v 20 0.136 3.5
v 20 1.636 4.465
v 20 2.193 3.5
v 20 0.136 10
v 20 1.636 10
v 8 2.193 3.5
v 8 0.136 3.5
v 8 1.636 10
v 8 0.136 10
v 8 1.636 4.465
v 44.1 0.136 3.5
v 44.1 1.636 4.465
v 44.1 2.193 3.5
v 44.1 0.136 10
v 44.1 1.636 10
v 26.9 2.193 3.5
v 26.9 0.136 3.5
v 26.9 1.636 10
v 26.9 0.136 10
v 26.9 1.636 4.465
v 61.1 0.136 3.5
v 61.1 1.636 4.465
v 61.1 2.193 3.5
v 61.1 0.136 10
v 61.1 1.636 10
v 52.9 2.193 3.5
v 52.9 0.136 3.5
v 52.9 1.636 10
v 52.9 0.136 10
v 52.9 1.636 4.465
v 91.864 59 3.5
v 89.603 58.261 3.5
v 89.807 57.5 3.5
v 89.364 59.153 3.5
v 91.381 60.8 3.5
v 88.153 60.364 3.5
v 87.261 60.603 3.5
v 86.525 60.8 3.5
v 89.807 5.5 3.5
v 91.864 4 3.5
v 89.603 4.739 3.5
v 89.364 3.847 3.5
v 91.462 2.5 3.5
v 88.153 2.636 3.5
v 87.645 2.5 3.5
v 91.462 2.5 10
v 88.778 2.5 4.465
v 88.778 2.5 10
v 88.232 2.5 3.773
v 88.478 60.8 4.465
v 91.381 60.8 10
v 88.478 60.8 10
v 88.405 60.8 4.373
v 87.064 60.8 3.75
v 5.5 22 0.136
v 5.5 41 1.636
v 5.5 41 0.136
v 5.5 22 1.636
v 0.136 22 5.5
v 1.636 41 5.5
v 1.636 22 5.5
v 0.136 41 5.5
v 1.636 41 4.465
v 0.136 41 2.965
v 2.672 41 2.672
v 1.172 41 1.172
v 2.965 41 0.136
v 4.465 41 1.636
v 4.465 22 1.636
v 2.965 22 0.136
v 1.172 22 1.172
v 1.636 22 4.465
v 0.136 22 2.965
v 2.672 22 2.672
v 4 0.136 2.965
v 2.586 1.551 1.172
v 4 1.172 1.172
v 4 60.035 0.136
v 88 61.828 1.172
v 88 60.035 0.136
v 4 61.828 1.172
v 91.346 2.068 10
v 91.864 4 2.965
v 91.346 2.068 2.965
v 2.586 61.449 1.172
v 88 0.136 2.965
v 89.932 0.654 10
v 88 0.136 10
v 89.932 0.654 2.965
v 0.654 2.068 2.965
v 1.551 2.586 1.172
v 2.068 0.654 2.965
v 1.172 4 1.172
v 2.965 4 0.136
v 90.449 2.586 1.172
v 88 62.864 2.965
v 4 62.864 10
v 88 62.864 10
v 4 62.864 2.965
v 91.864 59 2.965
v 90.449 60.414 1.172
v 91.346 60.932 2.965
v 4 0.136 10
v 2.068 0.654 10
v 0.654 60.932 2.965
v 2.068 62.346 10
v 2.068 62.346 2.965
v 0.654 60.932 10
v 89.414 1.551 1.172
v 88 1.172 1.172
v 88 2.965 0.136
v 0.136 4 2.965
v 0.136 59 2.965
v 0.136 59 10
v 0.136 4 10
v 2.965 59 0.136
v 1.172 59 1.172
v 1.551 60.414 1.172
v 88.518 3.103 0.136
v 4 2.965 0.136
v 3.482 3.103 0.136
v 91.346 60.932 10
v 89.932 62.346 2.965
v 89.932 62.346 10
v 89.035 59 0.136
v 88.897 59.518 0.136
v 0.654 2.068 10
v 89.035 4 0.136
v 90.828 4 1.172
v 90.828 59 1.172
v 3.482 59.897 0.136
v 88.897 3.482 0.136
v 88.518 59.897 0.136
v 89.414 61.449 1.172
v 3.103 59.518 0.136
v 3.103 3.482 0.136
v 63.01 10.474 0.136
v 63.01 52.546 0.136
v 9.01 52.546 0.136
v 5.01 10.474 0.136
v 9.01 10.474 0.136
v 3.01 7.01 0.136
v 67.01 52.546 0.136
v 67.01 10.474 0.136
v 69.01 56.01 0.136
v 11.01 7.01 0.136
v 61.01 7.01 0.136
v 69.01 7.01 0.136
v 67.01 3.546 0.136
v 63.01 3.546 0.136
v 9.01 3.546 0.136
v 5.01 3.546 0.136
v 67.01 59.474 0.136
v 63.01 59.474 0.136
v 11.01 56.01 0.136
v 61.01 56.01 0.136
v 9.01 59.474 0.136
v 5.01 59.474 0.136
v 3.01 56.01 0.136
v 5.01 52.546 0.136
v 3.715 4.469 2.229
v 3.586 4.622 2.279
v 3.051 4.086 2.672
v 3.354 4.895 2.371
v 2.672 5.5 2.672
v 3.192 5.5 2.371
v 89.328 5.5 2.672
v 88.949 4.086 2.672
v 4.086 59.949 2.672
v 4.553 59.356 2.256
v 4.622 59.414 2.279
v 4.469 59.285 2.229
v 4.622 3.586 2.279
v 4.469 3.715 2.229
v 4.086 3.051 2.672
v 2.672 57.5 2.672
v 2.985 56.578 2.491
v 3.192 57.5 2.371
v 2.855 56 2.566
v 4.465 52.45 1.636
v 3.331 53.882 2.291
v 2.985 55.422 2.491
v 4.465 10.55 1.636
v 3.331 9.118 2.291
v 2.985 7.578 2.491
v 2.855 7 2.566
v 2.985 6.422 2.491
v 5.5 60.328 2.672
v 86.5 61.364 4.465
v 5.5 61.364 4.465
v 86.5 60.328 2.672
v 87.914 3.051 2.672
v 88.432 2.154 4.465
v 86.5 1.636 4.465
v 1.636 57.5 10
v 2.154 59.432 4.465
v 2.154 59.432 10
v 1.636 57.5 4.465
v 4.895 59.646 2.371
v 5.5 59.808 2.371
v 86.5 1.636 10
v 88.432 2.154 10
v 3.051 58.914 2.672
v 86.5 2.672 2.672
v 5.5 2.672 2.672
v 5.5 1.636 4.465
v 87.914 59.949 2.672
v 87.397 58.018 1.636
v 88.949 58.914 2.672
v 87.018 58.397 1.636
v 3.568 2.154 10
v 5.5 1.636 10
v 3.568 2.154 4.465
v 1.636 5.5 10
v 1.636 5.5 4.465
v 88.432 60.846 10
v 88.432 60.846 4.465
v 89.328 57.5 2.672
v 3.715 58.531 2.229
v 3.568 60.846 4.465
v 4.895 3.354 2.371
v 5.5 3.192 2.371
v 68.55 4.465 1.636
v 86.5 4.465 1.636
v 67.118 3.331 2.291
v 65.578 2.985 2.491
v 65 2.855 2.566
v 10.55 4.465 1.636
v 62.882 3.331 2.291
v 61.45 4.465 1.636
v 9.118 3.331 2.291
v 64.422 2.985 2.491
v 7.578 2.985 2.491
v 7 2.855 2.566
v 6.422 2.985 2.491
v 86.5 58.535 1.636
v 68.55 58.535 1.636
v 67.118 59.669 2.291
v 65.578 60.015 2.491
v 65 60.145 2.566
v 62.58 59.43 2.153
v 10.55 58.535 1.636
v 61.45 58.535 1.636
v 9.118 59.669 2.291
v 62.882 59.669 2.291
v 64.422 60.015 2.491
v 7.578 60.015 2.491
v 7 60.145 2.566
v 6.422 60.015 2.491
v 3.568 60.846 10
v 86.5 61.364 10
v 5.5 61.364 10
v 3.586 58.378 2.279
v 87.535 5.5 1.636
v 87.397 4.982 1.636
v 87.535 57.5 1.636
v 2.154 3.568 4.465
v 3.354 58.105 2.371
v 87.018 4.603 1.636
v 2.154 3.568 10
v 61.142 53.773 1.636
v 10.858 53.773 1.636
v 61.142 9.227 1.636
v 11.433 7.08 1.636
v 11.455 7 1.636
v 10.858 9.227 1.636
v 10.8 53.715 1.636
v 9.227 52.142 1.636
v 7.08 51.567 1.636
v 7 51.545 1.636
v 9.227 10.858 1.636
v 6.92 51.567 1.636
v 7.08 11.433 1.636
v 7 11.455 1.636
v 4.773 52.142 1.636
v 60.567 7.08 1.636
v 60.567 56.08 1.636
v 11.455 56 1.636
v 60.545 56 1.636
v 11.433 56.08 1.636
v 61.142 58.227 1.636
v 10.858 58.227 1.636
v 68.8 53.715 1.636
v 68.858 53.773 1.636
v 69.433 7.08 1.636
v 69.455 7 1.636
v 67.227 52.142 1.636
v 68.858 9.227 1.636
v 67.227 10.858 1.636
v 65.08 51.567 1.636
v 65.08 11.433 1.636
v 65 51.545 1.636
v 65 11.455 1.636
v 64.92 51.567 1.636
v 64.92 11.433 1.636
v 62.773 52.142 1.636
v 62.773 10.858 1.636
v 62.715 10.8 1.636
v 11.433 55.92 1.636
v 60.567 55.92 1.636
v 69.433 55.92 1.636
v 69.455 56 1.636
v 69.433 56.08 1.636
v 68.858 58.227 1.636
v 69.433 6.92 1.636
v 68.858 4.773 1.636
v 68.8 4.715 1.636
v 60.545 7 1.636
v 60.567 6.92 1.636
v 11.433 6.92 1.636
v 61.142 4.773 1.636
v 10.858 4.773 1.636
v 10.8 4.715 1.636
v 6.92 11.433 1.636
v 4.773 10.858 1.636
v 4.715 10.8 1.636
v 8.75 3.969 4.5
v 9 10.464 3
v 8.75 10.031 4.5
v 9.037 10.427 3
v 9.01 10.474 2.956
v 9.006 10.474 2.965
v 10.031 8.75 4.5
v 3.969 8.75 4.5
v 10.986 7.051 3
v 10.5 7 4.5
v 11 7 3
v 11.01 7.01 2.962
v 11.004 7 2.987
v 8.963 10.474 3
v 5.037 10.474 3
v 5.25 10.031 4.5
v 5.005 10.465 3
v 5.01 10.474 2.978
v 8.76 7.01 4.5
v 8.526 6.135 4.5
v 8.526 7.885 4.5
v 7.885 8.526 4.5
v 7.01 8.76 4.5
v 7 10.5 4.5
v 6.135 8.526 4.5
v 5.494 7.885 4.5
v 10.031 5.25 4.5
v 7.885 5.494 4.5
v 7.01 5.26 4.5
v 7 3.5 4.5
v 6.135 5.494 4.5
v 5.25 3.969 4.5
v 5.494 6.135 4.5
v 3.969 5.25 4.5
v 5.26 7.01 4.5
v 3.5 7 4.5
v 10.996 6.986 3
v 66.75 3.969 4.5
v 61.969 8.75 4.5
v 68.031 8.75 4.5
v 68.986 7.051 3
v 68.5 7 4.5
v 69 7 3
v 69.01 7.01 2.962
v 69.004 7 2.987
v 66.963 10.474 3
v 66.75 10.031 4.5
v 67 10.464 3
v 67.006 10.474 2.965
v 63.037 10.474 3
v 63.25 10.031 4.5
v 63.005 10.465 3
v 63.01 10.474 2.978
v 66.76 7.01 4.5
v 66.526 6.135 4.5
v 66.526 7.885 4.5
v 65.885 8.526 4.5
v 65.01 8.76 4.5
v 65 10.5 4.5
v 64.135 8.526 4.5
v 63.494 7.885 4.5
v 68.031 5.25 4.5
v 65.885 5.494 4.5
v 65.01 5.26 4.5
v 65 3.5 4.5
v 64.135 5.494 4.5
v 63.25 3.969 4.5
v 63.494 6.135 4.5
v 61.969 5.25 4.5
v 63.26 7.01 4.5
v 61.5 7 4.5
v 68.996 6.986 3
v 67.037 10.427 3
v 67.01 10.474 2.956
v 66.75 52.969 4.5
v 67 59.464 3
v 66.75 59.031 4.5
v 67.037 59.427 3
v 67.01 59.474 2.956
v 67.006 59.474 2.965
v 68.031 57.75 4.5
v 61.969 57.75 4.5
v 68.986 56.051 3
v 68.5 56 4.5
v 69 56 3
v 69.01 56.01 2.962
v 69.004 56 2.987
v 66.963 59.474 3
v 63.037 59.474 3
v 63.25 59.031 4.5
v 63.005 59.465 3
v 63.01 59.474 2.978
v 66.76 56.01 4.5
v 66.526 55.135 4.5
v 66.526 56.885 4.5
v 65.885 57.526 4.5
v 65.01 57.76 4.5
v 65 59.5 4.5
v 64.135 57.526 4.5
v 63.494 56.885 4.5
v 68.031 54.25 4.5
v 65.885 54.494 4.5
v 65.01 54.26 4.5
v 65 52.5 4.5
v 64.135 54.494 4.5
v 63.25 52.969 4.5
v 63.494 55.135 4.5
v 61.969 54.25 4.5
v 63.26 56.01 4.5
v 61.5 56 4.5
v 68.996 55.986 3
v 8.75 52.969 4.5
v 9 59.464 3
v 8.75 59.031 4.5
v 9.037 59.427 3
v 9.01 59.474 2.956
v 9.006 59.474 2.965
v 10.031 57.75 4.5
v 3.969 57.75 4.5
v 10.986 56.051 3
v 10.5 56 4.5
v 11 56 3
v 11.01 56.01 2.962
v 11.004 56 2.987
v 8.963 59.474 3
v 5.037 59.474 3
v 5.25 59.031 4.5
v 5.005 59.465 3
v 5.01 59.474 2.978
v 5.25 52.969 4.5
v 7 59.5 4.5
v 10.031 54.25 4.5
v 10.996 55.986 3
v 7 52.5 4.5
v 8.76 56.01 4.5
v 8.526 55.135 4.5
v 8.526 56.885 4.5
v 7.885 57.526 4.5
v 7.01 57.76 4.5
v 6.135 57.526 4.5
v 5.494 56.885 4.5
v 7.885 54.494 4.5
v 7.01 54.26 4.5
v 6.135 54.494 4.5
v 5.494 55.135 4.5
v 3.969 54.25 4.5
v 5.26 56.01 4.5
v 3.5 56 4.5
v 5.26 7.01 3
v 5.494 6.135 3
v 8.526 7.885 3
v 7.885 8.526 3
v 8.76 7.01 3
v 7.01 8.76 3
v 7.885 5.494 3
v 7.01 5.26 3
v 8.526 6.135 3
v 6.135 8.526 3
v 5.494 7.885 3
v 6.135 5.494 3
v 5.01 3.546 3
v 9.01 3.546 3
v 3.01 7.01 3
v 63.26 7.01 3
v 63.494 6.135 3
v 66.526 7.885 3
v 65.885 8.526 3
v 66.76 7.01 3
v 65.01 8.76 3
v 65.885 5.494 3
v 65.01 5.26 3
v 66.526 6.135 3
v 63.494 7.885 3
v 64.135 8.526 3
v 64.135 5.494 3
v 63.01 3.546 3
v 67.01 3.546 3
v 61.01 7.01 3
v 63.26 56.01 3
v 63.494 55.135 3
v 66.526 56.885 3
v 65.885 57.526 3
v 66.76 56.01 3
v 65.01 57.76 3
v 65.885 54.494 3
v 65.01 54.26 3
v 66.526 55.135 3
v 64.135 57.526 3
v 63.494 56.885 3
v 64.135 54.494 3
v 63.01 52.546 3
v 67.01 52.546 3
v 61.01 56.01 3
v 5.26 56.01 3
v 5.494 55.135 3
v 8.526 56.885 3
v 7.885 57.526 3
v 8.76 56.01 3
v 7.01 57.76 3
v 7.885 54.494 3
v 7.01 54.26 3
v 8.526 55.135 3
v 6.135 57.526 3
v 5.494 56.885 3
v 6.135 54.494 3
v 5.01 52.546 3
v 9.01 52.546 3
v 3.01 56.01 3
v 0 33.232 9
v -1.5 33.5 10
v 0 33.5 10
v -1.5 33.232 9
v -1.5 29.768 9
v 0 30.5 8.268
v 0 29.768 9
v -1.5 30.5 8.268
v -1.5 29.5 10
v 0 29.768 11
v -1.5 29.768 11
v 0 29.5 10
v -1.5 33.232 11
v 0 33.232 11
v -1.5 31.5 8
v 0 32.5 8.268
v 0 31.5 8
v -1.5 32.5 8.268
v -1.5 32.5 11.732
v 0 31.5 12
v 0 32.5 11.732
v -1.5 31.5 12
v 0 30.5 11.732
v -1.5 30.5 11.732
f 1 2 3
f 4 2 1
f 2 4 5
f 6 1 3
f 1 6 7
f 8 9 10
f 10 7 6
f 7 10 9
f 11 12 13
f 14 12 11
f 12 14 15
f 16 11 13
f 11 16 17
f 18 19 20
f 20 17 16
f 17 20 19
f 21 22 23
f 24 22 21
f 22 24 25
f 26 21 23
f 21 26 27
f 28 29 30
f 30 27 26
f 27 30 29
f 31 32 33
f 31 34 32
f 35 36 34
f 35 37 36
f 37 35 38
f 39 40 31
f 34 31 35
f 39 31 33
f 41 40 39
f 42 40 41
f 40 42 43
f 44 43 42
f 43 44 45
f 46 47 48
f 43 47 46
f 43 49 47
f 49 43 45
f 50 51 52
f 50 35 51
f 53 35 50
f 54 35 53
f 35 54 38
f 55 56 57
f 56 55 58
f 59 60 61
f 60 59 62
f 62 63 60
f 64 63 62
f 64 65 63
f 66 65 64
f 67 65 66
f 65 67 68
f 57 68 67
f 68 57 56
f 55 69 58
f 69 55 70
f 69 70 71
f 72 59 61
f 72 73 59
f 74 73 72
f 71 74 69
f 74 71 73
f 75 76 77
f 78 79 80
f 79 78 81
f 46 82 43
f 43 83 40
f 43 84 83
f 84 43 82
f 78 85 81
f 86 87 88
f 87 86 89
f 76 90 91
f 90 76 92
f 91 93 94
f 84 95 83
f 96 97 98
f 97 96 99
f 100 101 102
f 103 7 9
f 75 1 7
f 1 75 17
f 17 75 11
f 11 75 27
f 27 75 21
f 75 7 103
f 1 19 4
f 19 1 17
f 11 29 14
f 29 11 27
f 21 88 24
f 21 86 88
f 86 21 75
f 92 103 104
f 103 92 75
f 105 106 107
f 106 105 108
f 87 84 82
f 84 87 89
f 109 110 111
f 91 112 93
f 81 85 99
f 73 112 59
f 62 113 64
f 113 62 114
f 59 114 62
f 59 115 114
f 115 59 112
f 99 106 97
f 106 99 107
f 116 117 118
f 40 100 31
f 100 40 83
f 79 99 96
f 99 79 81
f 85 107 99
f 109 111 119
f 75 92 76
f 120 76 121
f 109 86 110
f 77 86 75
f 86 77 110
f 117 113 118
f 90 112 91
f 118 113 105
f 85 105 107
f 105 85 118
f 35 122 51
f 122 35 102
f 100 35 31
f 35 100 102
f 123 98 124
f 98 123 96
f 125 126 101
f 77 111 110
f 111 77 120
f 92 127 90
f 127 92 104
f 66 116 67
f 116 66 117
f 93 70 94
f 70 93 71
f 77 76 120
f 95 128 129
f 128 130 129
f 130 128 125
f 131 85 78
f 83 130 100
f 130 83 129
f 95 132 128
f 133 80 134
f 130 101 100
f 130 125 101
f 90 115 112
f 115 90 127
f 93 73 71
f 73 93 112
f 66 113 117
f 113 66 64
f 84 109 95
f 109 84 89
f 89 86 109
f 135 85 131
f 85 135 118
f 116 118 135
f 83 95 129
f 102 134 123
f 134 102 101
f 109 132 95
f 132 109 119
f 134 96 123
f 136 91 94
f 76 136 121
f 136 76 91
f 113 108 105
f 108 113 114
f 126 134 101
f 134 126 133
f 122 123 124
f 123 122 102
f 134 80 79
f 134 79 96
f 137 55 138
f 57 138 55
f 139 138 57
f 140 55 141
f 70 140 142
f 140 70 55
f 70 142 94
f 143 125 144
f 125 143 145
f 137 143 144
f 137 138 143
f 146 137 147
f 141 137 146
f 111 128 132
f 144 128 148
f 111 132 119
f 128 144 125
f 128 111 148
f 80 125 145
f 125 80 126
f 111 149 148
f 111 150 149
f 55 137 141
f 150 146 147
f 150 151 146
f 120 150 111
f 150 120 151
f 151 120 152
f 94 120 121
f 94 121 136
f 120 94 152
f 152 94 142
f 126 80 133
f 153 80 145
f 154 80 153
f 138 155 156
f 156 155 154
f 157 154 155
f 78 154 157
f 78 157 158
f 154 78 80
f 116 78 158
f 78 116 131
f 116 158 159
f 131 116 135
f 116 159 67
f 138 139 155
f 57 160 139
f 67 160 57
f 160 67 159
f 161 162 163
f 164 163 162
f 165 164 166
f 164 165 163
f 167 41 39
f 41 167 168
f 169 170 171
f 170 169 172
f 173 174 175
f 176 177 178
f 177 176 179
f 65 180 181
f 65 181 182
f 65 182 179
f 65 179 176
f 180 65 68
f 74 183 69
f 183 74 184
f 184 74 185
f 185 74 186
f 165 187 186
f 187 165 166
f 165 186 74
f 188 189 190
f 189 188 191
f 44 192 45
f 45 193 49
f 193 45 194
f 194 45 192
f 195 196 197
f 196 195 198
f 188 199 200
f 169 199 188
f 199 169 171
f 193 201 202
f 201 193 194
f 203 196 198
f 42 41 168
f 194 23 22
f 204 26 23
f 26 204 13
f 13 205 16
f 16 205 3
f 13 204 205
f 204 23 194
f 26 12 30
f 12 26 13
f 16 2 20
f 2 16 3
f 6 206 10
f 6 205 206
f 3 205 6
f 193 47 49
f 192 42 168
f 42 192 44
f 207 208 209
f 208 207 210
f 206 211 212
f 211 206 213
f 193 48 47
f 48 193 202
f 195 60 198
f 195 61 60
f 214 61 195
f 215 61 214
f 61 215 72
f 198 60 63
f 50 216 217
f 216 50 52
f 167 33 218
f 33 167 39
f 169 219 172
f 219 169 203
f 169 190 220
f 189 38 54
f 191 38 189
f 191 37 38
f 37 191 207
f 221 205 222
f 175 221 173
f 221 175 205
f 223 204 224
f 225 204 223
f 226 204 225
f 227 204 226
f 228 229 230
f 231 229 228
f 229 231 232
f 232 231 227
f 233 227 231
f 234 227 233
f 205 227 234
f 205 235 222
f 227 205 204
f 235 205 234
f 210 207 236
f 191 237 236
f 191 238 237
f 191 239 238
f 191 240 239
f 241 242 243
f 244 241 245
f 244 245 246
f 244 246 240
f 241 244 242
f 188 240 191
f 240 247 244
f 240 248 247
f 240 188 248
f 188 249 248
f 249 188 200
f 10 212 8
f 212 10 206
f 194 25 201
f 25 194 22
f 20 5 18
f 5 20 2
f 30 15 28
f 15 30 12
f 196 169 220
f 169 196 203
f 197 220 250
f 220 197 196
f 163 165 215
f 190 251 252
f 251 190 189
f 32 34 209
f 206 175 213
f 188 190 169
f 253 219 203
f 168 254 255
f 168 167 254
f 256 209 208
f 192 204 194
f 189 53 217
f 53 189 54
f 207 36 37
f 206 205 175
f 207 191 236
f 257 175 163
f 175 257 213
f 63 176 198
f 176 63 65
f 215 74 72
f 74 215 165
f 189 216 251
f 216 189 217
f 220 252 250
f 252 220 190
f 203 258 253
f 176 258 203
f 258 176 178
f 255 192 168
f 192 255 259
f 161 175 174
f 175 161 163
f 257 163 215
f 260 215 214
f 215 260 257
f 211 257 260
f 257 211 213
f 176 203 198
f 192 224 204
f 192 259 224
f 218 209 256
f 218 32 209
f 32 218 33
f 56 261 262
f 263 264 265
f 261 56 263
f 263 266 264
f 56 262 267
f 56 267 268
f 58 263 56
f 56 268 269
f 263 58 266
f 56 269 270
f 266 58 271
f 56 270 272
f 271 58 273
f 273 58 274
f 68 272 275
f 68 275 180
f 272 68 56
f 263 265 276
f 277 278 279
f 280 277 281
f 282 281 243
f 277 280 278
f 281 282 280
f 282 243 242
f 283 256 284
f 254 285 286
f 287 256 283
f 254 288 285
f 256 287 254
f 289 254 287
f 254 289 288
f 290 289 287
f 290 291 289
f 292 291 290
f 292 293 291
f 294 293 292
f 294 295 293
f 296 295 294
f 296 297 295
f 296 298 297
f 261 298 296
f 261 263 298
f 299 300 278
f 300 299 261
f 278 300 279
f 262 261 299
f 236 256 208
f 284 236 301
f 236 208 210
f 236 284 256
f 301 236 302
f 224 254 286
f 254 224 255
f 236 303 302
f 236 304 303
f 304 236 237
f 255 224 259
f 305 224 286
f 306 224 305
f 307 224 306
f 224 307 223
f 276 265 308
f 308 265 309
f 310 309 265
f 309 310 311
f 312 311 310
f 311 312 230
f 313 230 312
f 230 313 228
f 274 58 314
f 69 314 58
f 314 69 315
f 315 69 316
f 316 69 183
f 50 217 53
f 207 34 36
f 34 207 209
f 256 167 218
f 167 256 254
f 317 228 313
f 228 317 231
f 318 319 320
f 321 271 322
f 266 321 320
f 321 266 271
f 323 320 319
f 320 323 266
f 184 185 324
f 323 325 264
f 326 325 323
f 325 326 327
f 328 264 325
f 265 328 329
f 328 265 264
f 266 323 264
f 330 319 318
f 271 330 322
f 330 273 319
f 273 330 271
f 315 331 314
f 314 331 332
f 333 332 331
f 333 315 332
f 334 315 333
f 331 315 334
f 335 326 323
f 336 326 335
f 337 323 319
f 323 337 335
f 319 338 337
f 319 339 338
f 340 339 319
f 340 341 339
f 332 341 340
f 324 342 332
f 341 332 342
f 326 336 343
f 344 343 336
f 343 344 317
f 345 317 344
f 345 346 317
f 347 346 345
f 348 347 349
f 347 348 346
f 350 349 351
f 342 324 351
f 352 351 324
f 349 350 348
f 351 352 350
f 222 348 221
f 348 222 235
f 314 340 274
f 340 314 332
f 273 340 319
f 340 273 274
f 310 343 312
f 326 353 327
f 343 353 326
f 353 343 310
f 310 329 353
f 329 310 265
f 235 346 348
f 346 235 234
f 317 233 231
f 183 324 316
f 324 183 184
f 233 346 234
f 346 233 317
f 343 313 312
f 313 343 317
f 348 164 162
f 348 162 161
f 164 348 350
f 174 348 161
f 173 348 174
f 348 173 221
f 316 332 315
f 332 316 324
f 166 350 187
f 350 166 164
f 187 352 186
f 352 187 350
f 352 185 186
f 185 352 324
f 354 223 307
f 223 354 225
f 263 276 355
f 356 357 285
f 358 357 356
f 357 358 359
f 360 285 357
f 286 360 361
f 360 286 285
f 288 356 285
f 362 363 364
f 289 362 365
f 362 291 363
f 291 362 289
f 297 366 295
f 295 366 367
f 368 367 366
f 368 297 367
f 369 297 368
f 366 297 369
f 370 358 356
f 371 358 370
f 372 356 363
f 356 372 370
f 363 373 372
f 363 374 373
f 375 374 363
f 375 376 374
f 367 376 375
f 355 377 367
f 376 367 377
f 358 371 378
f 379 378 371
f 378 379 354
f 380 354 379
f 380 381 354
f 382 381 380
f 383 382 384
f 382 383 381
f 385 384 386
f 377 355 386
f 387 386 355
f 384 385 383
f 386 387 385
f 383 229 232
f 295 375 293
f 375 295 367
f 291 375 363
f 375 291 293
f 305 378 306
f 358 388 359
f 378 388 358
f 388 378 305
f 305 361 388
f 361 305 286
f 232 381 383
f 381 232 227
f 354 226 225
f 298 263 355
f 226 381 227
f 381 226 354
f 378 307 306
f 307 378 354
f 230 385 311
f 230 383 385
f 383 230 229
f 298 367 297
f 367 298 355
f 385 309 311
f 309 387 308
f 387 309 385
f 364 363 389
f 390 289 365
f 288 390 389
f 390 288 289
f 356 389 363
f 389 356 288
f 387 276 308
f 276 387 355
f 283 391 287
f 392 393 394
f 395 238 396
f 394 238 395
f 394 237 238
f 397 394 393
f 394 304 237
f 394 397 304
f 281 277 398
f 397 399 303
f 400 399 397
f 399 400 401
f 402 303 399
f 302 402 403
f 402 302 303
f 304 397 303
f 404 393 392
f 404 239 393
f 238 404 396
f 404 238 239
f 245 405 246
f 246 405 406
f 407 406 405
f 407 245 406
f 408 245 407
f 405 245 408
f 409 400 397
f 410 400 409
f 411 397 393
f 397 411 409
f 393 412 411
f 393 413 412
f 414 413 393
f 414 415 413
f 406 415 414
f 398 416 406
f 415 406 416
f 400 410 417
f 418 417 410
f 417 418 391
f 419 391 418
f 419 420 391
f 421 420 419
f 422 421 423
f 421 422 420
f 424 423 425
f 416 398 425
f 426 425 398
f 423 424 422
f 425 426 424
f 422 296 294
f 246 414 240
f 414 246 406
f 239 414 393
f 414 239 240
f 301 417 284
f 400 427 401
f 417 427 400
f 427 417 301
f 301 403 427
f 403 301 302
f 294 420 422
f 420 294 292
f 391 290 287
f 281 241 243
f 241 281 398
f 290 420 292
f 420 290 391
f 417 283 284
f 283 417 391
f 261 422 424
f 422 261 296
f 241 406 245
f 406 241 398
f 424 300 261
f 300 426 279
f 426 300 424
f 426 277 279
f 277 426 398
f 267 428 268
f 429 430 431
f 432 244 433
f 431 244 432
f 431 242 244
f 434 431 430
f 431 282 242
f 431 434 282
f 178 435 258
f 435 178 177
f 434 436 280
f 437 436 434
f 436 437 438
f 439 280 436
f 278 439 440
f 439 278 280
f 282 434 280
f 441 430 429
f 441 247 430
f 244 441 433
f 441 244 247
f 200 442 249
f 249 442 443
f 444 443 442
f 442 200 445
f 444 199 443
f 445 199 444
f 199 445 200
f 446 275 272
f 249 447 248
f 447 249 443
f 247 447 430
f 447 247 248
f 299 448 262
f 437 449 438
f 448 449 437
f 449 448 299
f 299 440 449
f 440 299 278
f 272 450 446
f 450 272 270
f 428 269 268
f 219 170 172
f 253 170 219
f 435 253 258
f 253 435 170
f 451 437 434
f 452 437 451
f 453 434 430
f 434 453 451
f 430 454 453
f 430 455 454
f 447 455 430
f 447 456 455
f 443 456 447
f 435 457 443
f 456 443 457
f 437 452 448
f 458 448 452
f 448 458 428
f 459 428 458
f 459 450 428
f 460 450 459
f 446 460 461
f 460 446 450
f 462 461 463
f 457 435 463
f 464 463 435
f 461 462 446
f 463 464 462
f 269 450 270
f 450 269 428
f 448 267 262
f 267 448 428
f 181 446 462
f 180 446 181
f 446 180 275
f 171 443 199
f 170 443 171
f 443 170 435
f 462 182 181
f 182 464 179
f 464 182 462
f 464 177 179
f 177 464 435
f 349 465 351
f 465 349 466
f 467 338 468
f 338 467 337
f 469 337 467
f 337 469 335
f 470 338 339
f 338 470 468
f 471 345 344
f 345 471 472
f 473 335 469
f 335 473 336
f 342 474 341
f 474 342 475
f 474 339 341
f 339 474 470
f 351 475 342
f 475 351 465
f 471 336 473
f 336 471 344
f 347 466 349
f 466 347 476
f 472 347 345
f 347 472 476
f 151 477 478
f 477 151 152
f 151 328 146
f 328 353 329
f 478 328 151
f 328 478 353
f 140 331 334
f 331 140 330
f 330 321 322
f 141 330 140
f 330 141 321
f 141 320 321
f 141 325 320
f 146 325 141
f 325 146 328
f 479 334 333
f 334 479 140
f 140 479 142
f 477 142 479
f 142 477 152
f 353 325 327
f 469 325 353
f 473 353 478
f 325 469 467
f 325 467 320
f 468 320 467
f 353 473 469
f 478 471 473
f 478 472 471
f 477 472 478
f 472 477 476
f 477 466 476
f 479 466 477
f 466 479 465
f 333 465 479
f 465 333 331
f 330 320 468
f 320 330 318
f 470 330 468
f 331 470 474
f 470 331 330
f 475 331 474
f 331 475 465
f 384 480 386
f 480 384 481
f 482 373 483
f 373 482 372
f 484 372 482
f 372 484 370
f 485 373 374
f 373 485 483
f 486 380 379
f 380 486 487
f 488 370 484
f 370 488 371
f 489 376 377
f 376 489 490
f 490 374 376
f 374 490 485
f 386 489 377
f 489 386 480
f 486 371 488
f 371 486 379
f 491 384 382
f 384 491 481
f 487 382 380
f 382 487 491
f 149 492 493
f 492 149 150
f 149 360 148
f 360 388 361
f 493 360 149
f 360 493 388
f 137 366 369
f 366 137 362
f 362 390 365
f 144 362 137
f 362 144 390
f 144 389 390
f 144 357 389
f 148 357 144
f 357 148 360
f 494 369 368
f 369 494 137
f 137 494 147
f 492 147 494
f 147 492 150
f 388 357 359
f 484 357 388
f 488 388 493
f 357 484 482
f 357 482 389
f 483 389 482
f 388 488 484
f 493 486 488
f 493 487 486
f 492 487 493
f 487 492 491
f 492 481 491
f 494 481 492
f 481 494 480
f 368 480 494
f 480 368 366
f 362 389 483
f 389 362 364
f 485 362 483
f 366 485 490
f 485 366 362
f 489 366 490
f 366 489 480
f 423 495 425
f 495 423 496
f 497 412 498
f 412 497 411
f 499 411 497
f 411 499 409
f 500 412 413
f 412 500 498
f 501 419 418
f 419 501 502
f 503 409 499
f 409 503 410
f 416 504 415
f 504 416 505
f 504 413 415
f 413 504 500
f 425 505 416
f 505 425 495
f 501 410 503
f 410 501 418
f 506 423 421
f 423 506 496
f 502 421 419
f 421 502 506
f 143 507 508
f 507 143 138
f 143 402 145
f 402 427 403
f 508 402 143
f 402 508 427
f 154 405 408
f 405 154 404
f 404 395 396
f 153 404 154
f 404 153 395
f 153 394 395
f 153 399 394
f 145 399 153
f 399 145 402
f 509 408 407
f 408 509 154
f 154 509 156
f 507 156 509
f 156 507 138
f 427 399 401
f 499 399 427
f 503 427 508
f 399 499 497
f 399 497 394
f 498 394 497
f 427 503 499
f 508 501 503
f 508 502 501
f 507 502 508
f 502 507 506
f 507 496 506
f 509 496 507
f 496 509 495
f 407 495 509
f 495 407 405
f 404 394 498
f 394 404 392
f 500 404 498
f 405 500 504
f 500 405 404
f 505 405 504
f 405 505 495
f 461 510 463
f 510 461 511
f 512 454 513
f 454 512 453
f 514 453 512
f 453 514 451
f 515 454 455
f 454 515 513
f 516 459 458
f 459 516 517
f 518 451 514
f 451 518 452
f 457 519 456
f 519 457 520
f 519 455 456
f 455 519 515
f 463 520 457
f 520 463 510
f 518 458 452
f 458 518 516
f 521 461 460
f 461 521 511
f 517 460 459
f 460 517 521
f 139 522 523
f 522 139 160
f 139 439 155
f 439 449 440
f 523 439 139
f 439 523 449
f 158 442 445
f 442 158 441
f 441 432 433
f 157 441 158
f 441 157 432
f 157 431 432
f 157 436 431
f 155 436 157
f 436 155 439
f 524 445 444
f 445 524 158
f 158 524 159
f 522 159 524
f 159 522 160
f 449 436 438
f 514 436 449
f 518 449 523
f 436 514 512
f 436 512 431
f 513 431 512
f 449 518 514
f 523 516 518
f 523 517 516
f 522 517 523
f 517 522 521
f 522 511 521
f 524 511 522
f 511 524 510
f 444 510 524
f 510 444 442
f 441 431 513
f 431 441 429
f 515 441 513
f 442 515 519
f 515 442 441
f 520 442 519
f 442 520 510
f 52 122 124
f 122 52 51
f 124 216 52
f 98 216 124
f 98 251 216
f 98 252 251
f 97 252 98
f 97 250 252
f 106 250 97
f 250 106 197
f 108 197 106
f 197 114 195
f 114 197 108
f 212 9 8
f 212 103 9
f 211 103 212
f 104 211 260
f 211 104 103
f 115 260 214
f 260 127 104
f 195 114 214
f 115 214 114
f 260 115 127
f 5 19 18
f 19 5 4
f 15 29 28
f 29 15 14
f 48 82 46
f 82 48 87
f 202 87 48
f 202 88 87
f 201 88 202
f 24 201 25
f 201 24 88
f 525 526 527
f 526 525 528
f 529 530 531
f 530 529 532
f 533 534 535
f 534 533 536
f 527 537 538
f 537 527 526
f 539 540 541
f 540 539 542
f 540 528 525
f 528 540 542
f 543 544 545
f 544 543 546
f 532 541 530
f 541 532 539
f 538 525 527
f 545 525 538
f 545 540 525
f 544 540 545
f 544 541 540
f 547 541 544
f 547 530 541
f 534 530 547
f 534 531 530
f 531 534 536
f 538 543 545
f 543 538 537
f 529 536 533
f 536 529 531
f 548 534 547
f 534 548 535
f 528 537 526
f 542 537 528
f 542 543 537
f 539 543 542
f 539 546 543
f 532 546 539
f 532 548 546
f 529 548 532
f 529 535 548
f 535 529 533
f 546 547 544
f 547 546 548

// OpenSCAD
/*  RASPBERRY PI2 case
-- Parametric as below
-- Uses a set of measurements for box cutouts for devices
-- Rounded corners
*/
/* Rasberry Pi2 box (should fit B+ as well)
How it works:
    Make a rounded box
    Subtract the interior 
    Enlarge the devices so they protrude then subtract them.
    Slice top and bottom halves.
    Add lugs, holes and stand offs
*/

board = [85, 56 , 1.3 ];  //dimension of rasp pi
t     = 1.40;             //Thickness of rasp pi board
p     = 1.5;              //Thickness of plastic case
g     = 2;                //gap around board
$fn   = 12;               //roundness of rendering
rb    = 4;                //roundness of box
huge  = 200;              // for drilling out holes etc 
stand_off = 3;            //raise board above bottom plastic
box   = board + [7 , 7, 20];  //outside dimensions of our case
bh    = 10;               //Where to slice box
d = 3.5;                  //displacement of hole from edge  
eps = 0.01;               //a very tiny value
/*
Actual device sizes and positions (some already extend over edge of board)
most of these numbers are measurements or off spec sheet
NOTE KEEPING TRACK OF COORDINATE SYSTEMS IS CRITICAL
These are measured  coordinates with zero point at BOTTOM lefthand corner of board

device = [[position of device],[device size],[adjust hole position], [enlarge device for hole]]
*/ 

micro =  [[6.5  ,-1.5 ,0] ,[8    ,6     , 3   ] ,[-1, -10,    0] , [2,   4,  2  ]];
hdmi  =  [[24.4 ,-2   ,0] ,[15.2 ,12    , 7.9 ] ,[0,  -10,    0] , [0,  10,  0  ]];
camera=  [[43   ,0    ,0] ,[4    ,22.4  , 7   ] ,[0,    0,    0] , [0,   0, 10  ]];
audio =  [[50.4 ,-2   ,0] ,[6.2  ,14.5  , 6.4 ] ,[0,  -10,    0] , [0,  10,  0  ]];
ether =  [[65.5 ,2    ,0] ,[21.2 ,15.9  , 15  ] ,[0,   -2,    0] , [5,   4, 10  ]];
//widen usb and ether so we dont have a thin vertical strip of weak plastic
usb1  =  [[70   ,21.4 ,0] ,[17.4 ,15.3  , 17.4] ,[0,   -2,    0] , [0,   4, 10  ]];
usb2  =  [[70   ,39   ,0] ,[17.4 ,15.3  , 17.4] ,[0,   -2,    0] , [0,   4, 10  ]];
gpio  =  [[7.2  ,50   ,0] ,[50   ,5.1   , 9   ] ,[0,    0,    0] , [0,   0, 10  ]];
display= [[1.5  ,17   ,0] ,[3.9  ,22.3  , 6   ] ,[0,    0,    0] , [0,   0, 10  ]];
//SD is below the board so needs to drop a fair bit to give access to the card
SD    =  [[-3  ,19.5 ,-2.5] ,[14   ,17  , 2.5 ] ,[-16,   0,    -4] , [6,   0,  4  ]];
// make a list so we can handle our devices as a group 
echidna = [micro,hdmi,camera,audio,ether,usb1,usb2,gpio,display,SD];  

shift =[p+g,p+g,p+stand_off];  //plastic + gap at edge and height of screw pad
holes =  [[p+g+d, p+g+d], [65, p+g+d], [65, 56], [p+g+d, 56]]  ;
toplugs =[
          [[box[0]*4/5,p+p/2, box[2]-bh],[90,0,0]],
          [[box[0]*4/5,box[1]-p-p/2,bh], [90,0,0]],
          [[p+p/2,box[1]*3/4-p-p,bh],[0,90,0]],
          [[p+p/2,box[1]/4-p-p,bh],[0,90,0]]
          ];        
 bottomlug =[[-p/2,box[1]/2,bh],[0,90,0]];

//Utility module to make a solid box with rounded corners
module hull_build(box,r){
    //spheres at the corners of a box and run hull over it
    x = box  - 2 * [r,r,r];
    difference(){
    hull(){
        for (i=[0:1]){
            for (j=[0:1]) {
                for (k=[0:1]){
                        translate([i*x[0],j*x[1],k*x[2]]+[r,r,r]) //move up r because we moved box up
                            sphere(r);
                            }            
                        }   
                    }  
              }   
         }  
}


module complete_box(){
    embiggen = [2,2,2]; // make holes 1mm bigger all round
    //substract devices out of our case
    difference(){
        hull_build(box,rb); //outer shell
        translate([p,p,p])hull_build(box-[p+p,p+p,p+p],rb);  //smaller box(interior)
    //move, embiggen then subtract
        for (i=echidna) {
            translate(i[0] + i[2] + shift -embiggen/2) 
                    cube(i[1]+ i[3] + embiggen);
                        }
                }
   }
   
module stand_off() {
    difference(){
        union(){
            children();  // this will the complete_box
            for (q=holes){
                translate([q[0],q[1],p+3/2]) 
                    cylinder(d1=9,d2=7,h=3,center=true); 
            }

        }  
        //put in eps to stop an error warning
        for (q=holes){
        translate([q[0]+eps,q[1]+eps,3/2]){
            cylinder(d=3.5,h=huge,center=true);
                cylinder(d=8,h=3,center=true,$fn=6);  
        }
    }
    }
}

module top_holes(){
    difference(){
        union(){
            children();  //this will be complete_box
            for (q=holes){
            translate([q[0],q[1],box[2]-p-p]) 
                    cylinder(d=3+p+p,h=3,center=true); //reinforcing plastic around top hole
            }
        }  
        for (q=holes){
        translate([q[0],q[1],3/2]){
           cylinder(d=3.5,h=huge,center=true);
        }
    }
    }
}


module bottom(){
difference() {
        //Add standoff and drill holes at same time
        stand_off(holes) complete_box();
        translate([-20,-20,bh])cube(huge);  //chop the top off
    }
    
    //put a lug at the end to stabilise the lid before screwing
        translate(bottomlug[0])
            rotate(bottomlug[1])
                cylinder(d=4,h=p,center=true);
}

module top(){

    difference(){
    intersection() {
        top_holes(holes)complete_box();  
        translate([-5,-11,bh])cube(huge);   //chop the bottom (note use of intersection)
        }
     }
     
     //Add 2 lugs at the end and one on each side [[position,rotation],..]
     for (lug = toplugs) {
            translate(lug[0]) 
                    rotate(lug[1]) 
                            cylinder(d=4,h=p,center=true);
        }
} 

//complete_box();
bottom();
//flip it over to print and move it to print
//translate([box[0],0,box[2]])rotate([0,180,0])top();  
